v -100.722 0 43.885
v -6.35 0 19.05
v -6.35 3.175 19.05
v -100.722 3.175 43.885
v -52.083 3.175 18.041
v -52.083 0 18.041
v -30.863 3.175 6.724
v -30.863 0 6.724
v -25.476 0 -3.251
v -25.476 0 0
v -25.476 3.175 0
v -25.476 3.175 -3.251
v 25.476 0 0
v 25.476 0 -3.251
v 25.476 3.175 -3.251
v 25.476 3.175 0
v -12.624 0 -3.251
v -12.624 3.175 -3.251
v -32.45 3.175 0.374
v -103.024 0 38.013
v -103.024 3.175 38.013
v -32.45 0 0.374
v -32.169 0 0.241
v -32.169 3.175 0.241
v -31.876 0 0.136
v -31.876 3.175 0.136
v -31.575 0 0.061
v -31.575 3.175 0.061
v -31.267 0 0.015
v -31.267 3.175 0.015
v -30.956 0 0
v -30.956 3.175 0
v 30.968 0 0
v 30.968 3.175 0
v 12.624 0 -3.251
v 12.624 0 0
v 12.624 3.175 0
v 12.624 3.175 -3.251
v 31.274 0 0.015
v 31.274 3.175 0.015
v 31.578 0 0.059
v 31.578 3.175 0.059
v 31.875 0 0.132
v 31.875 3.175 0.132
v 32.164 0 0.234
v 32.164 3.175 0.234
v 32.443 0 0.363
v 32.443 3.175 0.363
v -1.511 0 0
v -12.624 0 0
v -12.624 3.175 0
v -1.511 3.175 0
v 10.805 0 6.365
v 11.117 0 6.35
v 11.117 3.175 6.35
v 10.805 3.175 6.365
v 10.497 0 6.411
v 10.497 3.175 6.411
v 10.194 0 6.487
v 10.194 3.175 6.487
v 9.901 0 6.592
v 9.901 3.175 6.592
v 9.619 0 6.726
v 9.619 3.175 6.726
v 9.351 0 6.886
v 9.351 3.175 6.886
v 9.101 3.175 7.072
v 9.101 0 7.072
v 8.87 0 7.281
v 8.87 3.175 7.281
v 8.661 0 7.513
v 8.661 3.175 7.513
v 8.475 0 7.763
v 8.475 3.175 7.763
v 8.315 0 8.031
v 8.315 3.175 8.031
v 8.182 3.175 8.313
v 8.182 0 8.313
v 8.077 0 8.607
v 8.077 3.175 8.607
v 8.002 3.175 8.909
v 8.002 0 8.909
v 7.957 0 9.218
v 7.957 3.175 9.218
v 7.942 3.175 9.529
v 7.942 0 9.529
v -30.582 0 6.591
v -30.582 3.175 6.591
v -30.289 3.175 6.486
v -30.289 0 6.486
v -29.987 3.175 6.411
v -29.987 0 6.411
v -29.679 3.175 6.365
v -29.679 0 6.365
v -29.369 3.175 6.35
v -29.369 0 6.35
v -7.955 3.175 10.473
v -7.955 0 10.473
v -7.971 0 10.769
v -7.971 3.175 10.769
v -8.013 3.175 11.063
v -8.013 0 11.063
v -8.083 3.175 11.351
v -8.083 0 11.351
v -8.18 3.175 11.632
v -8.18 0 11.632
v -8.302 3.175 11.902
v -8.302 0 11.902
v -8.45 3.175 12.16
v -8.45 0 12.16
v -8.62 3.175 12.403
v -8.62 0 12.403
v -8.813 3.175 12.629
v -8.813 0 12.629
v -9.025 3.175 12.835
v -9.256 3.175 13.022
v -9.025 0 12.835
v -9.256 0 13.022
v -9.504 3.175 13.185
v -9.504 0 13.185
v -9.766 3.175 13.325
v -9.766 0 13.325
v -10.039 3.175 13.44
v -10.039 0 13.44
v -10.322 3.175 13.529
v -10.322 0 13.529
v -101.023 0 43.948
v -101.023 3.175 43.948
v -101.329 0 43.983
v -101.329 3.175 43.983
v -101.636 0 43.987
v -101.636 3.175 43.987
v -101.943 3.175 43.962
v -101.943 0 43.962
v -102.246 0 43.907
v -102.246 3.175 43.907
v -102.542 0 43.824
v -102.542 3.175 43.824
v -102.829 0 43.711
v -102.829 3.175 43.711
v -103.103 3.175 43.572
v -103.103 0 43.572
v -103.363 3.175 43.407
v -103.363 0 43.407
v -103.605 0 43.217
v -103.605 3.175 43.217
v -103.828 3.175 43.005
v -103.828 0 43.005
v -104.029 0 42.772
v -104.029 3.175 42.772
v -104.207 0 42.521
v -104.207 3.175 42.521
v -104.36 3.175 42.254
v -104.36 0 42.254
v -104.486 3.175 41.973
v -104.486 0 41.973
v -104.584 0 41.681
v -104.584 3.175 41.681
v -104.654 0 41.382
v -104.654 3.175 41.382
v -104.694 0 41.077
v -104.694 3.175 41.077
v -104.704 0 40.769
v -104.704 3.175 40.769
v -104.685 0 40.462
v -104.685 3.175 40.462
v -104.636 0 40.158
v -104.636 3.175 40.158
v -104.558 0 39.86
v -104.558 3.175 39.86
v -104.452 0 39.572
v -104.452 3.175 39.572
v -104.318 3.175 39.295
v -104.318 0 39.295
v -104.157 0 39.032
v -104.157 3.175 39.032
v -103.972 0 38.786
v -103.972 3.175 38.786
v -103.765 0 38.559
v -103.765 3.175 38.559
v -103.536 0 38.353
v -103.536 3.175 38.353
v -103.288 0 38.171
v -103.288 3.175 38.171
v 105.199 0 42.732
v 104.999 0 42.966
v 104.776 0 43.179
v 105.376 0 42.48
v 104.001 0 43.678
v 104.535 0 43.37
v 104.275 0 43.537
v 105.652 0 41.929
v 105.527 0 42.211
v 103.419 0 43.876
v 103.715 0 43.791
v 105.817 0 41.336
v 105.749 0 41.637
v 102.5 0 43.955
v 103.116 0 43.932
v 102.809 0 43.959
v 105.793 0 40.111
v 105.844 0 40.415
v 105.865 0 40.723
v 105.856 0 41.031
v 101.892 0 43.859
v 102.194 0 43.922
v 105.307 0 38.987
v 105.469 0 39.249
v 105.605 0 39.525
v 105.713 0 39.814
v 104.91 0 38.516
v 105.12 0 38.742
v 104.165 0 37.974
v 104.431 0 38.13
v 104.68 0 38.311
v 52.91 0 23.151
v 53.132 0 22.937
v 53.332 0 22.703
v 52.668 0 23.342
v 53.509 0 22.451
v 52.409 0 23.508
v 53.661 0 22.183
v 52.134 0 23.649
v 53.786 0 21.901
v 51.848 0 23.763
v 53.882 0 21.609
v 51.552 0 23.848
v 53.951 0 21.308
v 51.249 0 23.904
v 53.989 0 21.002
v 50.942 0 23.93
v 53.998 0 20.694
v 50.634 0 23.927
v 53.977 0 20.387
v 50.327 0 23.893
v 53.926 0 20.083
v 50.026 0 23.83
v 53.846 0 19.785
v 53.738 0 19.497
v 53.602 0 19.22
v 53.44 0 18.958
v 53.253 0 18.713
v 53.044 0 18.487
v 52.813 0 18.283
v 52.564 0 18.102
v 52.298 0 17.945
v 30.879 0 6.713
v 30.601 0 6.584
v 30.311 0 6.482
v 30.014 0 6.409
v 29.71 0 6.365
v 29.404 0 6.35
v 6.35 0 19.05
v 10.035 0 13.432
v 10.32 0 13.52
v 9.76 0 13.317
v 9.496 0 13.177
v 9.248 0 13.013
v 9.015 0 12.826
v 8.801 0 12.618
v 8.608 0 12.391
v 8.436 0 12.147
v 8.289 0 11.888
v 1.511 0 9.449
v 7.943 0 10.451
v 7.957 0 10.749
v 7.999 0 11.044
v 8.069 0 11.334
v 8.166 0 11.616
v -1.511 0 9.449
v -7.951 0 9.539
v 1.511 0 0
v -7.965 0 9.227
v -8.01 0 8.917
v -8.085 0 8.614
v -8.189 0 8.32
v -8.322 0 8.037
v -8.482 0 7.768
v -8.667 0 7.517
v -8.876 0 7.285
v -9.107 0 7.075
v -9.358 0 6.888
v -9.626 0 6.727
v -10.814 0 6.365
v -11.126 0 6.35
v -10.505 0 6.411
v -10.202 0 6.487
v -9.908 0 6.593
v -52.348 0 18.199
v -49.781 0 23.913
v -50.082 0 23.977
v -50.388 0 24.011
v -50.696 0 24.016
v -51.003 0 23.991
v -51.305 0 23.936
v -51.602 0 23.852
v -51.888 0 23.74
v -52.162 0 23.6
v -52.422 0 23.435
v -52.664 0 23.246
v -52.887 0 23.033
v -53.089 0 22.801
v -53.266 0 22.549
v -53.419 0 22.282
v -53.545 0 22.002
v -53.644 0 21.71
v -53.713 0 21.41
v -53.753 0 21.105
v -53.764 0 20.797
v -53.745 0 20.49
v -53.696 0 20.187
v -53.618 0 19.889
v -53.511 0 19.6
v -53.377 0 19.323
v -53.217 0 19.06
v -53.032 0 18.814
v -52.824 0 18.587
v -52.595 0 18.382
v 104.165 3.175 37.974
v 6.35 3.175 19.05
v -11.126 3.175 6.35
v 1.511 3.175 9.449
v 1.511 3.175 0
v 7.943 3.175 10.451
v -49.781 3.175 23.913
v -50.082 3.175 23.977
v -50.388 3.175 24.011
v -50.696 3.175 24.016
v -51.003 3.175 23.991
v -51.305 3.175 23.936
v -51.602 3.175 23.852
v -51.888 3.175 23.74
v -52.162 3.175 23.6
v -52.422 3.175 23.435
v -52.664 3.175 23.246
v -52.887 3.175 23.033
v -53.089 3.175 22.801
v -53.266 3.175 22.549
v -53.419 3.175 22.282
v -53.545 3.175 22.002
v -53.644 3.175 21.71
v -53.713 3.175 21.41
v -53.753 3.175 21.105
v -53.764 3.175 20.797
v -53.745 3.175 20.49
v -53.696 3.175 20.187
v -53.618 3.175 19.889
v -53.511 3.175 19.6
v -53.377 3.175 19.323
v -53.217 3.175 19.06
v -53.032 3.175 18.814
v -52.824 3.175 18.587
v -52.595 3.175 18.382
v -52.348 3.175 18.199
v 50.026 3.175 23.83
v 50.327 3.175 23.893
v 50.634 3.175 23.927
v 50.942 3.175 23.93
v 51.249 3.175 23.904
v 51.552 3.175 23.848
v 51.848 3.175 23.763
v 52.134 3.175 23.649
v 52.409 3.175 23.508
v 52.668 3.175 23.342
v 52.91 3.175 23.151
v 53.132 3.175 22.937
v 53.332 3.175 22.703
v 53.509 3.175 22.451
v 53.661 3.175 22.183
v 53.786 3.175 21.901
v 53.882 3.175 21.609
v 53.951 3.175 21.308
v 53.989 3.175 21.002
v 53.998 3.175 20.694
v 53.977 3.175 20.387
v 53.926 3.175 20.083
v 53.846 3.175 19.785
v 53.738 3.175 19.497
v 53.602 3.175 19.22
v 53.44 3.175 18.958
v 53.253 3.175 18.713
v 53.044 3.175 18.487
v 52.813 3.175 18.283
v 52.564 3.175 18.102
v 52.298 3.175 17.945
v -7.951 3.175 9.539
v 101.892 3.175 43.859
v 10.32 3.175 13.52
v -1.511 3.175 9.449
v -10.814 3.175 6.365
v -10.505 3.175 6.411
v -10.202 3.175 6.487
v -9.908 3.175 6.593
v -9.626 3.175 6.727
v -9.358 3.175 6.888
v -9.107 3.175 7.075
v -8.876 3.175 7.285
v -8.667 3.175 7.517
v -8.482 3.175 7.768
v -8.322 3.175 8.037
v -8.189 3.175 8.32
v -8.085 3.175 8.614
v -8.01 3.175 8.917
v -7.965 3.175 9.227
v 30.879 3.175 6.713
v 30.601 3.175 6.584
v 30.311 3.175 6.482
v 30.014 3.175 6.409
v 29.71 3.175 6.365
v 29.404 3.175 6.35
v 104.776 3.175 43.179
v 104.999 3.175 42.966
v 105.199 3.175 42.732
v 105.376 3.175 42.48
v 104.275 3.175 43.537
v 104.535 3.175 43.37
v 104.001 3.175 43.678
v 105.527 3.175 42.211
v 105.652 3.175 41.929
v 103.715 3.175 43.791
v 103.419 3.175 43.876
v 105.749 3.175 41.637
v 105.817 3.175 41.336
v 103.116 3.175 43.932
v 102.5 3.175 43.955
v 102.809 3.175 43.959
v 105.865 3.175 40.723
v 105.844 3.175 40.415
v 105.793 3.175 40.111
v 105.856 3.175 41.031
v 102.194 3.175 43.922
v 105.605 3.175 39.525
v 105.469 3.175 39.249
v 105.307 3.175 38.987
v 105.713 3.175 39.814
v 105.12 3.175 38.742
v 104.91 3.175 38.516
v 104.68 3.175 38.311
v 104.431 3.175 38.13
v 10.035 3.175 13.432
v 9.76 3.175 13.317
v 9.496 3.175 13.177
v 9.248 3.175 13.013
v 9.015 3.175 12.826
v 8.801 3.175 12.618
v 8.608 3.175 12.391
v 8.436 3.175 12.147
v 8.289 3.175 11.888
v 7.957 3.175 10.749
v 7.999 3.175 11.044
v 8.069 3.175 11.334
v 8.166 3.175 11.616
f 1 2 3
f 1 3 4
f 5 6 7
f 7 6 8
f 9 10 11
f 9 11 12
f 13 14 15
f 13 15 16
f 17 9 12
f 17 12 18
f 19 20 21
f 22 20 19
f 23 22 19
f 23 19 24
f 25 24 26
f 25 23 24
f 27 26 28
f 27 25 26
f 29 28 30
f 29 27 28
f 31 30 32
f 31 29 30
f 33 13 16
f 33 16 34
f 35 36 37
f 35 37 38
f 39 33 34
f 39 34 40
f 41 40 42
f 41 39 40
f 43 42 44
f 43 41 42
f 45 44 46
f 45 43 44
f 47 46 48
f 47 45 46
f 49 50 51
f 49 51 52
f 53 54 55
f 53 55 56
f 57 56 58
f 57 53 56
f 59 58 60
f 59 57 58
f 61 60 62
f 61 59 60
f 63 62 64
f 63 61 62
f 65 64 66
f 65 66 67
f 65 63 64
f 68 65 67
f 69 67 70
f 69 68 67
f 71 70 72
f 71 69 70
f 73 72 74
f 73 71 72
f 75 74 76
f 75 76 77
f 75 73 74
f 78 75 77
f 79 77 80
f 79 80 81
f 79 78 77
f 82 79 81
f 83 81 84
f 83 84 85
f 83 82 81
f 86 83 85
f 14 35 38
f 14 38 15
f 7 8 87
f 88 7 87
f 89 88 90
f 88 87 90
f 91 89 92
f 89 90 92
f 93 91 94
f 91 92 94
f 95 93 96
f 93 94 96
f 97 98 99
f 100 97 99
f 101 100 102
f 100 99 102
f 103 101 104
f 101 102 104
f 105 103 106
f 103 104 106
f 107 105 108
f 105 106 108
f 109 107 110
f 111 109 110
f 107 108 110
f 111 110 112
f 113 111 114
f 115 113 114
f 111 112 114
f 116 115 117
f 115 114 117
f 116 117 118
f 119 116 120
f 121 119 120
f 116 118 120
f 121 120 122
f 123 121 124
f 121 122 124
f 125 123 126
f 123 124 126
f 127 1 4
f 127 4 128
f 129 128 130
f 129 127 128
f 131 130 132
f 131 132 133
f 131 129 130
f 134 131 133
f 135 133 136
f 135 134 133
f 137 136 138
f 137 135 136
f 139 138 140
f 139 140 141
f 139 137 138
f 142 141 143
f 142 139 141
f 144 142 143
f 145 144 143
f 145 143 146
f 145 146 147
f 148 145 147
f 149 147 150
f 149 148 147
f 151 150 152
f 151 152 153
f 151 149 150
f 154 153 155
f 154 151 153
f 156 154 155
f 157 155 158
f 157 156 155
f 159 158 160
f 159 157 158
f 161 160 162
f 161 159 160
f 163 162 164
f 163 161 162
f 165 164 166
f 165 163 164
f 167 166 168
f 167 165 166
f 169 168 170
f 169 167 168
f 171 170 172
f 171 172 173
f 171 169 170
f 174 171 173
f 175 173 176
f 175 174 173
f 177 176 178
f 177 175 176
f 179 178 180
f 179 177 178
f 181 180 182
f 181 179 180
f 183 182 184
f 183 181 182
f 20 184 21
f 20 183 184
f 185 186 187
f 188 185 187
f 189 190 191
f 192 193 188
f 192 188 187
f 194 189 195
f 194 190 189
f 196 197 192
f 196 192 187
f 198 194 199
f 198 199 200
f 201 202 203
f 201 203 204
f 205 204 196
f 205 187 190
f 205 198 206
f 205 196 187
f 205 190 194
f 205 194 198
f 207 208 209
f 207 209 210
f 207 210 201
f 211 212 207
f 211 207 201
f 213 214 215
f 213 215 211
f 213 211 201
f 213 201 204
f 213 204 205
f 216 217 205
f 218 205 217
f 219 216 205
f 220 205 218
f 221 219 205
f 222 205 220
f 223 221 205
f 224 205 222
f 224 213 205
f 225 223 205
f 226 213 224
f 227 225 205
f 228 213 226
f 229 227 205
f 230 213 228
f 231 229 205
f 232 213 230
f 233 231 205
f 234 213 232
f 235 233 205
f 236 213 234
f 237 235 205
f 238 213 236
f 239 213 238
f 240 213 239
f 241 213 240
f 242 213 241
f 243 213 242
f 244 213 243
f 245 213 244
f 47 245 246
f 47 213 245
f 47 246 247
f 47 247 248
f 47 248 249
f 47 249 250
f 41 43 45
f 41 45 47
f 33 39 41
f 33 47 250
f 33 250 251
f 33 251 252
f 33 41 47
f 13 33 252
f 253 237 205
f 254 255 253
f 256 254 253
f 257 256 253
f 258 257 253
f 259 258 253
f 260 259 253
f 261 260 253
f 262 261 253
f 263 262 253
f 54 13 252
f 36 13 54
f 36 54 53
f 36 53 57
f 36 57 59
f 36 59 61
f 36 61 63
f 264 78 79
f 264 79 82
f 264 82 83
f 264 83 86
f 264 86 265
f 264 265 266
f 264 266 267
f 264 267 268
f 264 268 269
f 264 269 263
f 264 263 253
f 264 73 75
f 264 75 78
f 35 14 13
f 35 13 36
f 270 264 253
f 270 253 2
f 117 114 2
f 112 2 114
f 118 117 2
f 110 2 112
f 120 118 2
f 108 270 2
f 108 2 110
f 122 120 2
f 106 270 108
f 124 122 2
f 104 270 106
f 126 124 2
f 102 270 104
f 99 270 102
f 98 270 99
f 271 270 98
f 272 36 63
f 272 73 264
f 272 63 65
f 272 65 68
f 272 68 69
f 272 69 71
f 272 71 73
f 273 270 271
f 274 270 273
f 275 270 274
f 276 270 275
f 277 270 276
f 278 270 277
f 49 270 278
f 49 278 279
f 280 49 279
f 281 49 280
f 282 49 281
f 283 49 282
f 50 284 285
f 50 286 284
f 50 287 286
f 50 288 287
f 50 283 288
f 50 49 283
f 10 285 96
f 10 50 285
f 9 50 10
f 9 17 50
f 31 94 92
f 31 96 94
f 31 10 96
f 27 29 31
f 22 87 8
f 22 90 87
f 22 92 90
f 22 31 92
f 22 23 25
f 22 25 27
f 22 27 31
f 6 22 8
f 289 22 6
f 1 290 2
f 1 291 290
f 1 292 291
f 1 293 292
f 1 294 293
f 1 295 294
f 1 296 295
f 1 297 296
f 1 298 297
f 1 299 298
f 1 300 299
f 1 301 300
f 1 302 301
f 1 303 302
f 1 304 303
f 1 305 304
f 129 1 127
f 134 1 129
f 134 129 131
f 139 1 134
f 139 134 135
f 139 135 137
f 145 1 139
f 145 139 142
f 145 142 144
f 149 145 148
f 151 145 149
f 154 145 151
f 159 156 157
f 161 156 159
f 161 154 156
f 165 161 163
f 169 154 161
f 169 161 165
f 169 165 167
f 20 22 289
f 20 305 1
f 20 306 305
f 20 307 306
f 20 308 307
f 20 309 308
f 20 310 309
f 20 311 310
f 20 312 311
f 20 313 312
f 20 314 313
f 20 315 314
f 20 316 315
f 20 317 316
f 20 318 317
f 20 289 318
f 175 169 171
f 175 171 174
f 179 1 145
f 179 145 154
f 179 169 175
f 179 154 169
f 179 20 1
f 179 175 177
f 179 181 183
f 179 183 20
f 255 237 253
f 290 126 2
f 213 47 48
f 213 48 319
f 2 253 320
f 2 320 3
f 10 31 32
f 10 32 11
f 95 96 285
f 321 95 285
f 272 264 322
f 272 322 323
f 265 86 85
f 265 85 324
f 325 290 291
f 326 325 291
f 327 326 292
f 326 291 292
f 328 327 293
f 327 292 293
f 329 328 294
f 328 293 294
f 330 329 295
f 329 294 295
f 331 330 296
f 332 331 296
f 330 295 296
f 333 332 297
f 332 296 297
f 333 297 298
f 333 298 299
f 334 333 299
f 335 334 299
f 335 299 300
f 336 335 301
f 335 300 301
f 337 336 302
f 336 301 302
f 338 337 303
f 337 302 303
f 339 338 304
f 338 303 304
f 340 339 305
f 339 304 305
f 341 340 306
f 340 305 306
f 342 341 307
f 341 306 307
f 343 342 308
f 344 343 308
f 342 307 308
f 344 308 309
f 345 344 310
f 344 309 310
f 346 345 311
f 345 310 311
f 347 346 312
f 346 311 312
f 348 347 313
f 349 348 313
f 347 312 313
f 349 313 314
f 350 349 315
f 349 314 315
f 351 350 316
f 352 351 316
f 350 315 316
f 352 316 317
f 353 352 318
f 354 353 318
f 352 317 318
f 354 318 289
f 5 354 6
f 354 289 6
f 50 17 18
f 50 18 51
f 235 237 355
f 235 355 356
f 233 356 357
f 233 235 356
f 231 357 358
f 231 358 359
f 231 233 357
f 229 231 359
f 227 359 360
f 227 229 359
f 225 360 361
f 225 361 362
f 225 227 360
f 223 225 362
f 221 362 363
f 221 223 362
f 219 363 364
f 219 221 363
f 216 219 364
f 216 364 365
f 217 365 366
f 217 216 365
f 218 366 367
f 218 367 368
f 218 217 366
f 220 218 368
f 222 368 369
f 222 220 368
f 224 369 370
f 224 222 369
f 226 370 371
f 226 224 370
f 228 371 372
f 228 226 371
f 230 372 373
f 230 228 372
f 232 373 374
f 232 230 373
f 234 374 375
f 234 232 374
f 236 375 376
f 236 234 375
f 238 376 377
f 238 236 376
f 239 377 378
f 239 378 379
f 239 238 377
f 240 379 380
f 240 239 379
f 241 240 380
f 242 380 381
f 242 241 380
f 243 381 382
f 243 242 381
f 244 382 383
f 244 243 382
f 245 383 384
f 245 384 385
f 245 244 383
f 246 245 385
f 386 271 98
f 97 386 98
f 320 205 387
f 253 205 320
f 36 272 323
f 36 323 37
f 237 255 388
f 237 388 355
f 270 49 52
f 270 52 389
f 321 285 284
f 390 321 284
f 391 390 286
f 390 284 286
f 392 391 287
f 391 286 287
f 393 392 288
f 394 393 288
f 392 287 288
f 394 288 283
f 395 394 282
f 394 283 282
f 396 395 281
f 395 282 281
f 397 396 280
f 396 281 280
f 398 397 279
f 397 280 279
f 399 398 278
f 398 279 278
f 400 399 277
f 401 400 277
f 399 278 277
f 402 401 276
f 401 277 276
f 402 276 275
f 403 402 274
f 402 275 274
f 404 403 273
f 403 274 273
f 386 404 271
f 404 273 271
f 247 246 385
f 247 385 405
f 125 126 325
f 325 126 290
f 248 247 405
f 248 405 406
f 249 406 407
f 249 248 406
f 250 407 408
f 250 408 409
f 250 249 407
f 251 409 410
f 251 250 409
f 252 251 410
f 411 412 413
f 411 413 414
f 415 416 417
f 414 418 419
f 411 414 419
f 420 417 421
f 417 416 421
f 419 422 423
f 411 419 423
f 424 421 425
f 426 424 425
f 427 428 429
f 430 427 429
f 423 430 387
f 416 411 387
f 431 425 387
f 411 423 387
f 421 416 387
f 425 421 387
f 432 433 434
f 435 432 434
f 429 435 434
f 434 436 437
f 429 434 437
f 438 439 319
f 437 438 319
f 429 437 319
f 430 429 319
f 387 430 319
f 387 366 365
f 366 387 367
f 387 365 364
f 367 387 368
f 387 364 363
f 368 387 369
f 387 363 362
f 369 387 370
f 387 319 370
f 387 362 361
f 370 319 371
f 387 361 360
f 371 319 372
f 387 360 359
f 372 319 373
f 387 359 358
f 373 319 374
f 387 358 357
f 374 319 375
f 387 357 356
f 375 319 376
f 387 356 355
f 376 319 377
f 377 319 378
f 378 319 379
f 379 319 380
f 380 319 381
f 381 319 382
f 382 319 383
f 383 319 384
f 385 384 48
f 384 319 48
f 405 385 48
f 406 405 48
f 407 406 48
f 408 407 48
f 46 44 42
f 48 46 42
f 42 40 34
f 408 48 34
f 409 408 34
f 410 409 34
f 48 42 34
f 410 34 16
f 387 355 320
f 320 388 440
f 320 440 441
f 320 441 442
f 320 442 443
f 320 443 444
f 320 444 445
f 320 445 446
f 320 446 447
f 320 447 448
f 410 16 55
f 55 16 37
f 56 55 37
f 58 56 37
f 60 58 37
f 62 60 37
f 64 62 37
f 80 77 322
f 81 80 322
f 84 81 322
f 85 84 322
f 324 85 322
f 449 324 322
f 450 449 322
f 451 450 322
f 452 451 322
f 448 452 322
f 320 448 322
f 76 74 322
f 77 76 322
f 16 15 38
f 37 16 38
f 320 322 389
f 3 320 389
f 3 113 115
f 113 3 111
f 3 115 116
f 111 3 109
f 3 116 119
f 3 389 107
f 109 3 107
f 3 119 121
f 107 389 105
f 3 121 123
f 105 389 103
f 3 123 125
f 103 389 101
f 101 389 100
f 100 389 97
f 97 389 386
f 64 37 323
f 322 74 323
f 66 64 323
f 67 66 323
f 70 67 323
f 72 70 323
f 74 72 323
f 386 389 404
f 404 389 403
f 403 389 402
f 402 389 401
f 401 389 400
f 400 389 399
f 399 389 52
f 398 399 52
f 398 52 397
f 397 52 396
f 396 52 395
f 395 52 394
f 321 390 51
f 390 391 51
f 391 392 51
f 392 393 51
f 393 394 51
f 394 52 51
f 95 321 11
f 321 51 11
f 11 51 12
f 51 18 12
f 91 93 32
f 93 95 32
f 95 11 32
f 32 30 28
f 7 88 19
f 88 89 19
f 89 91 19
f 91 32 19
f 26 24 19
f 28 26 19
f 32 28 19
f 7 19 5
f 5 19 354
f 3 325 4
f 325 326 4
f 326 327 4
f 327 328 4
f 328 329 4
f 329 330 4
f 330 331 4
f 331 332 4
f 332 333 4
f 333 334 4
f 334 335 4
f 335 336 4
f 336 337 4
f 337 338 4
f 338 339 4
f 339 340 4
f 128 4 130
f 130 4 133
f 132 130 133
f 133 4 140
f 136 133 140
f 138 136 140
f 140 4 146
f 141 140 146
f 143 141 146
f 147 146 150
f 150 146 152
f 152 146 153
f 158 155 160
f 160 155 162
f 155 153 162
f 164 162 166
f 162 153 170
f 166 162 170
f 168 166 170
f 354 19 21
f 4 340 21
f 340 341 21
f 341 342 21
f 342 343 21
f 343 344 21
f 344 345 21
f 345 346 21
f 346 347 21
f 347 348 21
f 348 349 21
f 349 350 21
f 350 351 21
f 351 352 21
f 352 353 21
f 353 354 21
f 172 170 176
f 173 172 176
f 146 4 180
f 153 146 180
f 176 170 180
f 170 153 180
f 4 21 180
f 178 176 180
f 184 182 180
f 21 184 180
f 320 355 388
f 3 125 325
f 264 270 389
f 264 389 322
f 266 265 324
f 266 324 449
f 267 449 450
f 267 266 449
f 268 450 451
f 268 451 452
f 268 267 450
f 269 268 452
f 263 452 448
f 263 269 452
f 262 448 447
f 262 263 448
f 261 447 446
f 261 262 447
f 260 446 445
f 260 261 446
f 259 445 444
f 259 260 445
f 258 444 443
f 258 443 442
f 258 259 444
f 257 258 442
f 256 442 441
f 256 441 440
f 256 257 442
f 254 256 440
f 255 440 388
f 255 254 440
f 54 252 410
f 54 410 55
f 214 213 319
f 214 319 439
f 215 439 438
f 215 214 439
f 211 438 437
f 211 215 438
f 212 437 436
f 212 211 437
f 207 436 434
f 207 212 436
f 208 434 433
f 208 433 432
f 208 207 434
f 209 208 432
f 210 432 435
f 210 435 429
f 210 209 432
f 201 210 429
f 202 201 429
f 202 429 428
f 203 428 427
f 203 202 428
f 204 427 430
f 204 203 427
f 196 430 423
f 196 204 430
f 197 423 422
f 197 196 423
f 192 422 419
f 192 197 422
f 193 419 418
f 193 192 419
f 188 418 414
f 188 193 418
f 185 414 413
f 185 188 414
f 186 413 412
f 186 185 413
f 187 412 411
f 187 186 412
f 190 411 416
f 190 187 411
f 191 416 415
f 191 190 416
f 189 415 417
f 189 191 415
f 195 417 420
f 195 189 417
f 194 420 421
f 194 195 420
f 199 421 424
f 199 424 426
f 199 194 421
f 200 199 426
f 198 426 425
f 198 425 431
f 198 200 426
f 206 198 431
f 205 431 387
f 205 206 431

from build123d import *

# Parameters (mm, degrees)
BOSS_EXTRUDE1_DEPTH = 3.175


with BuildPart() as part:
    # Sketch2 → Boss-Extrude1 (new body)
    with BuildSketch(Plane(origin=(0, 0, 0), x_dir=(1, 0, 0), z_dir=(0, 1, 0))):
        with BuildLine():
            Line((1.5113, 0), (12.6238, 0))
            Line((12.6238, 0), (12.6238, 3.2512))
            Line((12.6238, 3.2512), (25.4762, 3.2512))
            Line((25.4762, 3.2512), (25.4762, 0))
            Line((25.4762, 0), (30.968022767, 0))
            ThreePointArc((30.968022767, 0), (31.727309935, -0.092126666), (32.442533737, -0.363160318))
            Line((32.442533737, -0.363160318), (104.164919451, -37.973926385))
            ThreePointArc((104.164919451, -37.973926385), (105.652252874, -41.929489283), (101.892440563, -43.858854449))
            Line((101.892440563, -43.858854449), (6.35, -19.05))
            Line((6.35, -19.05), (-6.35, -19.05))
            Line((-6.35, -19.05), (-100.721752751, -43.884671777))
            ThreePointArc((-100.721752751, -43.884671777), (-104.485708905, -41.973107934), (-103.023886624, -38.012739533))
            Line((-103.023886624, -38.012739533), (-32.450367647, -0.373529412))
            ThreePointArc((-32.450367647, -0.373529412), (-31.726300609, -0.094797562), (-30.95625, 0))
            Line((-30.95625, 0), (-25.4762, 0))
            Line((-25.4762, 0), (-25.4762, 3.2512))
            Line((-25.4762, 3.2512), (-12.6238, 3.2512))
            Line((-12.6238, 3.2512), (-12.6238, 0))
            Line((-12.6238, 0), (-1.5113, 0))
            Line((-1.5113, 0), (-1.5113, -9.4488))
            Line((-1.5113, -9.4488), (1.5113, -9.4488))
            Line((1.5113, -9.4488), (1.5113, 0))
        make_face()
        with BuildLine():
            Line((-52.083424577, -18.041159774), (-30.862867647, -6.723529412))
            ThreePointArc((-30.862867647, -6.723529412), (-30.138800609, -6.444797562), (-29.36875, -6.35))
            Line((-29.36875, -6.35), (-11.126341516, -6.35))
            ThreePointArc((-11.126341516, -6.35), (-8.876399737, -7.28482434), (-7.951371556, -9.538811345))
            Line((-7.951371556, -9.538811345), (-7.955433254, -10.472519677))
            ThreePointArc((-7.955433254, -10.472519677), (-8.620060106, -12.402622549), (-10.322386989, -13.529169988))
            Line((-10.322386989, -13.529169988), (-49.781290705, -23.913092018))
            ThreePointArc((-49.781290705, -23.913092018), (-53.545246858, -22.001528175), (-52.083424577, -18.041159774))
        make_face(mode=Mode.SUBTRACT)
        with BuildLine():
            Line((7.941592001, -9.529086738), (7.942778948, -10.451228904))
            ThreePointArc((7.942778948, -10.451228904), (8.607635671, -12.39131781), (10.3198084, -13.520230548))
            Line((10.3198084, -13.520230548), (50.025691322, -23.830386583))
            ThreePointArc((50.025691322, -23.830386583), (53.785503632, -21.901021417), (52.29817021, -17.945458519))
            Line((52.29817021, -17.945458519), (30.878579271, -6.713160318))
            ThreePointArc((30.878579271, -6.713160318), (30.163355469, -6.442126666), (29.404068301, -6.35))
            Line((29.404068301, -6.35), (11.116589371, -6.35))
            ThreePointArc((11.116589371, -6.35), (8.870080926, -7.281381315), (7.941592001, -9.529086738))
        make_face(mode=Mode.SUBTRACT)
    extrude(amount=BOSS_EXTRUDE1_DEPTH)


solid = part.part
